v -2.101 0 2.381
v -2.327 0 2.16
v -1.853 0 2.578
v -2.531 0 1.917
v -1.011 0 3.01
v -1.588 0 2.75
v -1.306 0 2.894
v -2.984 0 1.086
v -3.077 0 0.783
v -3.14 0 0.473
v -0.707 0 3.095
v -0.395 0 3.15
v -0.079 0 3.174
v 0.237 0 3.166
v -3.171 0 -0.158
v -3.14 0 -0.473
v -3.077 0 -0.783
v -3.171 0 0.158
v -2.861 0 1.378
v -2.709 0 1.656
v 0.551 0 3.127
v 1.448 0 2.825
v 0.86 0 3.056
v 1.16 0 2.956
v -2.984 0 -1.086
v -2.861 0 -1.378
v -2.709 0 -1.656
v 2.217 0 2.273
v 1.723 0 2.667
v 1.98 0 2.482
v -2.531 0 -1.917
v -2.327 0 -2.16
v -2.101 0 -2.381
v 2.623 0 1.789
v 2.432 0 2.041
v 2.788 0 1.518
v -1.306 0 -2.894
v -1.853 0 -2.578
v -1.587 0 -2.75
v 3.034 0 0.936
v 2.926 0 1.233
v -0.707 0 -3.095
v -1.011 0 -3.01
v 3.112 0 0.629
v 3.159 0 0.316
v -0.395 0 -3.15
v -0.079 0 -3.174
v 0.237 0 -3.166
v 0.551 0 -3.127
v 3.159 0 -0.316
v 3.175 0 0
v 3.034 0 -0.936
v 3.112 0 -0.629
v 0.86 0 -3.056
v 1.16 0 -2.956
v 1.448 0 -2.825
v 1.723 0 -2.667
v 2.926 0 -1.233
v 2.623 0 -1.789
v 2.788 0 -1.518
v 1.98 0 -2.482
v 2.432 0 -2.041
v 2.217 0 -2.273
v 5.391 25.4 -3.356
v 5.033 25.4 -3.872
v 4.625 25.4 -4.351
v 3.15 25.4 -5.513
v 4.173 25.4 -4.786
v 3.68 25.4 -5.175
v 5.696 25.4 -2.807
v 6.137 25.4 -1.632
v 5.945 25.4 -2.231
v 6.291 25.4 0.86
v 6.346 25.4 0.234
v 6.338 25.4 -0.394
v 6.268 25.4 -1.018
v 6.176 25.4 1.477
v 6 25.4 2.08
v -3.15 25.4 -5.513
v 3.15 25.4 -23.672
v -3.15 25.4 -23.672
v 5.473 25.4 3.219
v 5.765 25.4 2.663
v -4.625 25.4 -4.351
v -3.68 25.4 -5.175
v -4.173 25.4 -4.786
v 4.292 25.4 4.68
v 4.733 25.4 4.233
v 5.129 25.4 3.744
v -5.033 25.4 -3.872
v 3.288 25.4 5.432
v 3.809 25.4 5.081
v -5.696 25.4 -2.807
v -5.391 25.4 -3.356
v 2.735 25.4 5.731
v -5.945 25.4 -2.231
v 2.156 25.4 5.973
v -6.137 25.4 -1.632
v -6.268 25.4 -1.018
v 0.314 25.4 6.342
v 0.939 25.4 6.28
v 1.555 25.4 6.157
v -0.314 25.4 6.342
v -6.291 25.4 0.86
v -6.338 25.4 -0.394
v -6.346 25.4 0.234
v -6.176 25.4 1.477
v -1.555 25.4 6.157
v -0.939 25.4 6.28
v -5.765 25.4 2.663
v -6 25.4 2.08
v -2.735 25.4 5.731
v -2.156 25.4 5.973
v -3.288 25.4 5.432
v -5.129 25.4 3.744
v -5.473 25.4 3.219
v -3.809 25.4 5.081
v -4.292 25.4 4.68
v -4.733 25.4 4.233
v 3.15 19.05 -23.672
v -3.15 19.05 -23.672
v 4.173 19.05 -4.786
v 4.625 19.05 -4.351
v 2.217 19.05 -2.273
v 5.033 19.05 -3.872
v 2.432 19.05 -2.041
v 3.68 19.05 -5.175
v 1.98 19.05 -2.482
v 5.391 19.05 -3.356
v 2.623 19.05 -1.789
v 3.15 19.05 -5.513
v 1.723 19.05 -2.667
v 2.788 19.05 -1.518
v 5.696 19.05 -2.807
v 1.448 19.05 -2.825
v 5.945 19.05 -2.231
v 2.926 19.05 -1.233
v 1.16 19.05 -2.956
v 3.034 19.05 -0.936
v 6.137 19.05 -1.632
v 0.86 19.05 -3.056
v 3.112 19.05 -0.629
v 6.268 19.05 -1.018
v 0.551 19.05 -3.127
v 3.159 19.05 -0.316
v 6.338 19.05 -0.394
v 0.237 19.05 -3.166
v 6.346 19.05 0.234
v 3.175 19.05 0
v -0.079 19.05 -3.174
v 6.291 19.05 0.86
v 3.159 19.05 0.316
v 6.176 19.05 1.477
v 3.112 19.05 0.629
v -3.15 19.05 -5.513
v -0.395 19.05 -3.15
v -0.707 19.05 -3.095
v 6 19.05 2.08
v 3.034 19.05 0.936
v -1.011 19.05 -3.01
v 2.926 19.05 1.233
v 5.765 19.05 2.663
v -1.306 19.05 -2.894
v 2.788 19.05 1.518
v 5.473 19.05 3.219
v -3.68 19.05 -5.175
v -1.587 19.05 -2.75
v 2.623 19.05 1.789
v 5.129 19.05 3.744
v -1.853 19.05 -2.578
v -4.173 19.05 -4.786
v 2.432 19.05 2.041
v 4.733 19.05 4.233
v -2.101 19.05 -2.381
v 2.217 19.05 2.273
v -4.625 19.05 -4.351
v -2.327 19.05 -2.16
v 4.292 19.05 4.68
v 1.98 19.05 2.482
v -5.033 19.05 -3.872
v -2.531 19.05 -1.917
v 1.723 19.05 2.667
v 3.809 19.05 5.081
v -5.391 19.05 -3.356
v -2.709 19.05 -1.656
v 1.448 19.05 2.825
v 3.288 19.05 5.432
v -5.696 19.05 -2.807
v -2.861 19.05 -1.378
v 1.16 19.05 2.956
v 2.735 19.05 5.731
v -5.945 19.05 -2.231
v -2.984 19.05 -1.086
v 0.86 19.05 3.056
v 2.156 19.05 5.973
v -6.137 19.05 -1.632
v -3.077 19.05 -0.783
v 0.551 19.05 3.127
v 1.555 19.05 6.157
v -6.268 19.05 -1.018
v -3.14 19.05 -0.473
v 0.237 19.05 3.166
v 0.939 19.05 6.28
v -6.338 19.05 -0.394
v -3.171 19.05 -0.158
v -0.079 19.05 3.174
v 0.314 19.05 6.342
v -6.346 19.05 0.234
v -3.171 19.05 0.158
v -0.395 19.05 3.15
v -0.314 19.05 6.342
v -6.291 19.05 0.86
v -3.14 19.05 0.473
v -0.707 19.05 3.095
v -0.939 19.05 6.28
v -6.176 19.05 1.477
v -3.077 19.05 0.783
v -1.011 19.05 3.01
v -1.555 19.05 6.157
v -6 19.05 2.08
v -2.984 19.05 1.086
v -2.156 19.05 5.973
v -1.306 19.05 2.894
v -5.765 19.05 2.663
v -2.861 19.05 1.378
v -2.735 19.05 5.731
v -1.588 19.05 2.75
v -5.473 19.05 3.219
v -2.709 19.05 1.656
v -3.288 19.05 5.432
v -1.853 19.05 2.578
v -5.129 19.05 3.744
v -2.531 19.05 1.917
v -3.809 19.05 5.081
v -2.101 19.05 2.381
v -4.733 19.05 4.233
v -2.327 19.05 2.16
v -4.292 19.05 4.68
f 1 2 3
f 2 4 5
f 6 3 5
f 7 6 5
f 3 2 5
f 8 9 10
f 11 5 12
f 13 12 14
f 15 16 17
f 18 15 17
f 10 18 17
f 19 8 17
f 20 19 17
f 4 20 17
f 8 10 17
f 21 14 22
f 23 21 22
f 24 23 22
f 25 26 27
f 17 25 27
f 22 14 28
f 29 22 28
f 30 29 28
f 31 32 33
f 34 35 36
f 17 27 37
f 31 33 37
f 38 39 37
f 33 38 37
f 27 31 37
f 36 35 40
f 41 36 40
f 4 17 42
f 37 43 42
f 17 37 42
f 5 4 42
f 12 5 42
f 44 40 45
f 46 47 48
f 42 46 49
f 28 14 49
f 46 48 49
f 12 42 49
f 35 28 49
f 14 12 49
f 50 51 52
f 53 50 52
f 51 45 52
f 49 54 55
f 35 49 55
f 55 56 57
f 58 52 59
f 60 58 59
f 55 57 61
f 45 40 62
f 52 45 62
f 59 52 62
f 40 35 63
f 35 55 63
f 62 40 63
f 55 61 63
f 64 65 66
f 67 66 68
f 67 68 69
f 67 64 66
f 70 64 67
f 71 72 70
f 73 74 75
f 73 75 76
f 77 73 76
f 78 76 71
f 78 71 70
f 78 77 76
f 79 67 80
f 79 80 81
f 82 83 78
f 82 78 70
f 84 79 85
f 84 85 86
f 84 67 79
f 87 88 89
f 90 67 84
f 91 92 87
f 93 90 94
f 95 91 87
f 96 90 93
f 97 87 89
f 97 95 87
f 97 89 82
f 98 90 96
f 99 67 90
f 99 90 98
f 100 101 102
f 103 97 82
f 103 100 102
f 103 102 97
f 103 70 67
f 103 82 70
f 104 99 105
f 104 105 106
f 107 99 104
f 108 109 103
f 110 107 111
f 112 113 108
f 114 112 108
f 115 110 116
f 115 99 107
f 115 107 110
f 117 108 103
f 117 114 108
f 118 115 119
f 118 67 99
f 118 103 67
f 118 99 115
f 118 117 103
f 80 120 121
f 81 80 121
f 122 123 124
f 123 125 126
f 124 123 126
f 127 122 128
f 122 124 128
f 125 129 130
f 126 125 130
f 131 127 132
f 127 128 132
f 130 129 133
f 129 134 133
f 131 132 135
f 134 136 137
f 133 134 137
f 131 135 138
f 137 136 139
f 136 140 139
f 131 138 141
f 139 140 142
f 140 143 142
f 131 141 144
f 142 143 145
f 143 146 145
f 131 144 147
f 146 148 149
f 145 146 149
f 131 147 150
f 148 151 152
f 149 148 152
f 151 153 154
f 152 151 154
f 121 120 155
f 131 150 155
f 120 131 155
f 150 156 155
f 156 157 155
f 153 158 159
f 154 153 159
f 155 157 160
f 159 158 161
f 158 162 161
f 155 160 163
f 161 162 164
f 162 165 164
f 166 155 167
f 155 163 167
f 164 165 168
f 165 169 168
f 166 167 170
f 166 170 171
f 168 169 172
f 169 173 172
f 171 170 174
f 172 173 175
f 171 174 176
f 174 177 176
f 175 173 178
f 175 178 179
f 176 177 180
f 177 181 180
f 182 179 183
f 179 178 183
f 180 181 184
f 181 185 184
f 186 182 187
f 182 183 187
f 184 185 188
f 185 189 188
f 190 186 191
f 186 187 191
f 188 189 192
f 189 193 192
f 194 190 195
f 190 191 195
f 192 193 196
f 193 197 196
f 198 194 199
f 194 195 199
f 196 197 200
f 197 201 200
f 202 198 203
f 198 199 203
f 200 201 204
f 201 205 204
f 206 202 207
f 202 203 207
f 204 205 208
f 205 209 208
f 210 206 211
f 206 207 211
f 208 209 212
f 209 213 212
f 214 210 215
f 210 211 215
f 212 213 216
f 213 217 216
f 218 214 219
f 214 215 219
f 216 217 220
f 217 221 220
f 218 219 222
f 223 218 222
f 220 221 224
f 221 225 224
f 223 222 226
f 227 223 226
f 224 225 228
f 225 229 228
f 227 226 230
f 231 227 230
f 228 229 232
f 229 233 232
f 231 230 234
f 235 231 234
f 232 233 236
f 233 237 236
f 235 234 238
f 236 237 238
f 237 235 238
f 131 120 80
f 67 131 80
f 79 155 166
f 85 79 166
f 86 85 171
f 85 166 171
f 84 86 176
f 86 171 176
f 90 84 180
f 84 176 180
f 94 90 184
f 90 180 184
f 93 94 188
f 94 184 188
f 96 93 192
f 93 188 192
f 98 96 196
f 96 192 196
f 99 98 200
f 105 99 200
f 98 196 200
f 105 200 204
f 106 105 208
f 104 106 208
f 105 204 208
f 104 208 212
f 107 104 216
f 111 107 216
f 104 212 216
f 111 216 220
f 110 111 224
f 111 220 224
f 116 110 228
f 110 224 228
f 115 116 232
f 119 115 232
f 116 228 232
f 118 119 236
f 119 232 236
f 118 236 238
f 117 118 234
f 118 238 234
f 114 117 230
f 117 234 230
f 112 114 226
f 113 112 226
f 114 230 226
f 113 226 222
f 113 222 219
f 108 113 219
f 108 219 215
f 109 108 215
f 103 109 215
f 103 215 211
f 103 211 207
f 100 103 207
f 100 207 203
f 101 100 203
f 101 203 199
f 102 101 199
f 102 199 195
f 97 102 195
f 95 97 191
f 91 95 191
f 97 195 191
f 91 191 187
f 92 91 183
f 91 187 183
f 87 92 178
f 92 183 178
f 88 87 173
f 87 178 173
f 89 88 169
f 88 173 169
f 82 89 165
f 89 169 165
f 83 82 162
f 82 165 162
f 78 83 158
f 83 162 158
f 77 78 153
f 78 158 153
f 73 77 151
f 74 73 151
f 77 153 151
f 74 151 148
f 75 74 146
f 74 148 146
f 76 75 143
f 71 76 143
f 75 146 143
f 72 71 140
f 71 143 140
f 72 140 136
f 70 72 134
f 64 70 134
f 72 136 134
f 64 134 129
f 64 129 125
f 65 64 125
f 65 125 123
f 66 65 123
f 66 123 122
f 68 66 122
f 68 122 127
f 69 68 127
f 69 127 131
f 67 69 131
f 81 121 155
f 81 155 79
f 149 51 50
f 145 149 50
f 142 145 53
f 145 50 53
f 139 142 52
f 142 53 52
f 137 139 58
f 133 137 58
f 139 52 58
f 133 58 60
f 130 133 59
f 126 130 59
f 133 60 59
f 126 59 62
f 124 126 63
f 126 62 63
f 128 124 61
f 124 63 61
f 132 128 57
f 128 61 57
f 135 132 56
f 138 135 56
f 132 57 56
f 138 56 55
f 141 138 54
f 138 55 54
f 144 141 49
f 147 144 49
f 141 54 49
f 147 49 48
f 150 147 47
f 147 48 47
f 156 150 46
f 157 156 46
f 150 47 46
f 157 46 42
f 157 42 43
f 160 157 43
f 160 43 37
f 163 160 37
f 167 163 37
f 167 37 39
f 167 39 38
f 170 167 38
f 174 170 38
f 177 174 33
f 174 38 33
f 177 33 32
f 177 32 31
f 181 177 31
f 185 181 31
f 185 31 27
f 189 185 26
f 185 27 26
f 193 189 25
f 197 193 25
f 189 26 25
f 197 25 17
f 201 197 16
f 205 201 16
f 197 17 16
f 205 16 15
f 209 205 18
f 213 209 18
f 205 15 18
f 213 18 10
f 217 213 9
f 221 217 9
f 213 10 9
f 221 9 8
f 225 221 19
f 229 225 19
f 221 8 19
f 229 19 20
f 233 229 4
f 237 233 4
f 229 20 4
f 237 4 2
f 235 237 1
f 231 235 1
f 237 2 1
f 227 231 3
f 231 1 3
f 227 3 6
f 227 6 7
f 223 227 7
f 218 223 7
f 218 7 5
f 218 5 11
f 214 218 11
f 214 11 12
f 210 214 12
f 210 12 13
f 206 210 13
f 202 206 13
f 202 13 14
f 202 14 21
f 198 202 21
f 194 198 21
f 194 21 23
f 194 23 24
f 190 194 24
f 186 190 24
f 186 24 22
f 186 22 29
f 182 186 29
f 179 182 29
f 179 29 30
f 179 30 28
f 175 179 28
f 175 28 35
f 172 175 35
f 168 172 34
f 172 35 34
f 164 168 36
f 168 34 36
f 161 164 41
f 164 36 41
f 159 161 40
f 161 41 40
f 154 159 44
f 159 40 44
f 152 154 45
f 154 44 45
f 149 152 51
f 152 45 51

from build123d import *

# Parameters (mm, degrees)
SKETCH1_R           = 3.175
BOSS_EXTRUDE1_DEPTH = 19.05
BOSS_EXTRUDE2_DEPTH = 6.35
SKETCH4_W           = 6.30056433
SKETCH4_H           = 6.35
BOSS_EXTRUDE3_DEPTH = 14.986


with BuildPart() as part:
    # Sketch1 → Boss-Extrude1 (new body)
    with BuildSketch(Plane(origin=(0, 0, 0), x_dir=(1, 0, 0), z_dir=(0, 1, 0))):
        Circle(SKETCH1_R)
    extrude(amount=BOSS_EXTRUDE1_DEPTH)

    # Sketch3 → Boss-Extrude2 (add)
    with BuildSketch(Plane(origin=(0, 19.05, 0), x_dir=(1, 0, 0), z_dir=(0, 1, 0))):
        with BuildLine():
            Line((3.150282165, 5.513458287), (3.150282165, 8.686029988))
            Line((3.150282165, 8.686029988), (-3.150282165, 8.686029988))
            Line((-3.150282165, 8.686029988), (-3.150282165, 5.513458287))
            ThreePointArc((-3.150282165, 5.513458287), (0, -6.35), (3.150282165, 5.513458287))
        make_face()
    extrude(amount=BOSS_EXTRUDE2_DEPTH)

    # Sketch4 → Boss-Extrude3 (add)
    with BuildSketch(Plane(origin=(0, 0, -8.686029988), x_dir=(-1, 0, 0), z_dir=(0, 0, -1))):
        with Locations((0, 22.225)):
            Rectangle(SKETCH4_W, SKETCH4_H)
    extrude(amount=BOSS_EXTRUDE3_DEPTH)


solid = part.part
